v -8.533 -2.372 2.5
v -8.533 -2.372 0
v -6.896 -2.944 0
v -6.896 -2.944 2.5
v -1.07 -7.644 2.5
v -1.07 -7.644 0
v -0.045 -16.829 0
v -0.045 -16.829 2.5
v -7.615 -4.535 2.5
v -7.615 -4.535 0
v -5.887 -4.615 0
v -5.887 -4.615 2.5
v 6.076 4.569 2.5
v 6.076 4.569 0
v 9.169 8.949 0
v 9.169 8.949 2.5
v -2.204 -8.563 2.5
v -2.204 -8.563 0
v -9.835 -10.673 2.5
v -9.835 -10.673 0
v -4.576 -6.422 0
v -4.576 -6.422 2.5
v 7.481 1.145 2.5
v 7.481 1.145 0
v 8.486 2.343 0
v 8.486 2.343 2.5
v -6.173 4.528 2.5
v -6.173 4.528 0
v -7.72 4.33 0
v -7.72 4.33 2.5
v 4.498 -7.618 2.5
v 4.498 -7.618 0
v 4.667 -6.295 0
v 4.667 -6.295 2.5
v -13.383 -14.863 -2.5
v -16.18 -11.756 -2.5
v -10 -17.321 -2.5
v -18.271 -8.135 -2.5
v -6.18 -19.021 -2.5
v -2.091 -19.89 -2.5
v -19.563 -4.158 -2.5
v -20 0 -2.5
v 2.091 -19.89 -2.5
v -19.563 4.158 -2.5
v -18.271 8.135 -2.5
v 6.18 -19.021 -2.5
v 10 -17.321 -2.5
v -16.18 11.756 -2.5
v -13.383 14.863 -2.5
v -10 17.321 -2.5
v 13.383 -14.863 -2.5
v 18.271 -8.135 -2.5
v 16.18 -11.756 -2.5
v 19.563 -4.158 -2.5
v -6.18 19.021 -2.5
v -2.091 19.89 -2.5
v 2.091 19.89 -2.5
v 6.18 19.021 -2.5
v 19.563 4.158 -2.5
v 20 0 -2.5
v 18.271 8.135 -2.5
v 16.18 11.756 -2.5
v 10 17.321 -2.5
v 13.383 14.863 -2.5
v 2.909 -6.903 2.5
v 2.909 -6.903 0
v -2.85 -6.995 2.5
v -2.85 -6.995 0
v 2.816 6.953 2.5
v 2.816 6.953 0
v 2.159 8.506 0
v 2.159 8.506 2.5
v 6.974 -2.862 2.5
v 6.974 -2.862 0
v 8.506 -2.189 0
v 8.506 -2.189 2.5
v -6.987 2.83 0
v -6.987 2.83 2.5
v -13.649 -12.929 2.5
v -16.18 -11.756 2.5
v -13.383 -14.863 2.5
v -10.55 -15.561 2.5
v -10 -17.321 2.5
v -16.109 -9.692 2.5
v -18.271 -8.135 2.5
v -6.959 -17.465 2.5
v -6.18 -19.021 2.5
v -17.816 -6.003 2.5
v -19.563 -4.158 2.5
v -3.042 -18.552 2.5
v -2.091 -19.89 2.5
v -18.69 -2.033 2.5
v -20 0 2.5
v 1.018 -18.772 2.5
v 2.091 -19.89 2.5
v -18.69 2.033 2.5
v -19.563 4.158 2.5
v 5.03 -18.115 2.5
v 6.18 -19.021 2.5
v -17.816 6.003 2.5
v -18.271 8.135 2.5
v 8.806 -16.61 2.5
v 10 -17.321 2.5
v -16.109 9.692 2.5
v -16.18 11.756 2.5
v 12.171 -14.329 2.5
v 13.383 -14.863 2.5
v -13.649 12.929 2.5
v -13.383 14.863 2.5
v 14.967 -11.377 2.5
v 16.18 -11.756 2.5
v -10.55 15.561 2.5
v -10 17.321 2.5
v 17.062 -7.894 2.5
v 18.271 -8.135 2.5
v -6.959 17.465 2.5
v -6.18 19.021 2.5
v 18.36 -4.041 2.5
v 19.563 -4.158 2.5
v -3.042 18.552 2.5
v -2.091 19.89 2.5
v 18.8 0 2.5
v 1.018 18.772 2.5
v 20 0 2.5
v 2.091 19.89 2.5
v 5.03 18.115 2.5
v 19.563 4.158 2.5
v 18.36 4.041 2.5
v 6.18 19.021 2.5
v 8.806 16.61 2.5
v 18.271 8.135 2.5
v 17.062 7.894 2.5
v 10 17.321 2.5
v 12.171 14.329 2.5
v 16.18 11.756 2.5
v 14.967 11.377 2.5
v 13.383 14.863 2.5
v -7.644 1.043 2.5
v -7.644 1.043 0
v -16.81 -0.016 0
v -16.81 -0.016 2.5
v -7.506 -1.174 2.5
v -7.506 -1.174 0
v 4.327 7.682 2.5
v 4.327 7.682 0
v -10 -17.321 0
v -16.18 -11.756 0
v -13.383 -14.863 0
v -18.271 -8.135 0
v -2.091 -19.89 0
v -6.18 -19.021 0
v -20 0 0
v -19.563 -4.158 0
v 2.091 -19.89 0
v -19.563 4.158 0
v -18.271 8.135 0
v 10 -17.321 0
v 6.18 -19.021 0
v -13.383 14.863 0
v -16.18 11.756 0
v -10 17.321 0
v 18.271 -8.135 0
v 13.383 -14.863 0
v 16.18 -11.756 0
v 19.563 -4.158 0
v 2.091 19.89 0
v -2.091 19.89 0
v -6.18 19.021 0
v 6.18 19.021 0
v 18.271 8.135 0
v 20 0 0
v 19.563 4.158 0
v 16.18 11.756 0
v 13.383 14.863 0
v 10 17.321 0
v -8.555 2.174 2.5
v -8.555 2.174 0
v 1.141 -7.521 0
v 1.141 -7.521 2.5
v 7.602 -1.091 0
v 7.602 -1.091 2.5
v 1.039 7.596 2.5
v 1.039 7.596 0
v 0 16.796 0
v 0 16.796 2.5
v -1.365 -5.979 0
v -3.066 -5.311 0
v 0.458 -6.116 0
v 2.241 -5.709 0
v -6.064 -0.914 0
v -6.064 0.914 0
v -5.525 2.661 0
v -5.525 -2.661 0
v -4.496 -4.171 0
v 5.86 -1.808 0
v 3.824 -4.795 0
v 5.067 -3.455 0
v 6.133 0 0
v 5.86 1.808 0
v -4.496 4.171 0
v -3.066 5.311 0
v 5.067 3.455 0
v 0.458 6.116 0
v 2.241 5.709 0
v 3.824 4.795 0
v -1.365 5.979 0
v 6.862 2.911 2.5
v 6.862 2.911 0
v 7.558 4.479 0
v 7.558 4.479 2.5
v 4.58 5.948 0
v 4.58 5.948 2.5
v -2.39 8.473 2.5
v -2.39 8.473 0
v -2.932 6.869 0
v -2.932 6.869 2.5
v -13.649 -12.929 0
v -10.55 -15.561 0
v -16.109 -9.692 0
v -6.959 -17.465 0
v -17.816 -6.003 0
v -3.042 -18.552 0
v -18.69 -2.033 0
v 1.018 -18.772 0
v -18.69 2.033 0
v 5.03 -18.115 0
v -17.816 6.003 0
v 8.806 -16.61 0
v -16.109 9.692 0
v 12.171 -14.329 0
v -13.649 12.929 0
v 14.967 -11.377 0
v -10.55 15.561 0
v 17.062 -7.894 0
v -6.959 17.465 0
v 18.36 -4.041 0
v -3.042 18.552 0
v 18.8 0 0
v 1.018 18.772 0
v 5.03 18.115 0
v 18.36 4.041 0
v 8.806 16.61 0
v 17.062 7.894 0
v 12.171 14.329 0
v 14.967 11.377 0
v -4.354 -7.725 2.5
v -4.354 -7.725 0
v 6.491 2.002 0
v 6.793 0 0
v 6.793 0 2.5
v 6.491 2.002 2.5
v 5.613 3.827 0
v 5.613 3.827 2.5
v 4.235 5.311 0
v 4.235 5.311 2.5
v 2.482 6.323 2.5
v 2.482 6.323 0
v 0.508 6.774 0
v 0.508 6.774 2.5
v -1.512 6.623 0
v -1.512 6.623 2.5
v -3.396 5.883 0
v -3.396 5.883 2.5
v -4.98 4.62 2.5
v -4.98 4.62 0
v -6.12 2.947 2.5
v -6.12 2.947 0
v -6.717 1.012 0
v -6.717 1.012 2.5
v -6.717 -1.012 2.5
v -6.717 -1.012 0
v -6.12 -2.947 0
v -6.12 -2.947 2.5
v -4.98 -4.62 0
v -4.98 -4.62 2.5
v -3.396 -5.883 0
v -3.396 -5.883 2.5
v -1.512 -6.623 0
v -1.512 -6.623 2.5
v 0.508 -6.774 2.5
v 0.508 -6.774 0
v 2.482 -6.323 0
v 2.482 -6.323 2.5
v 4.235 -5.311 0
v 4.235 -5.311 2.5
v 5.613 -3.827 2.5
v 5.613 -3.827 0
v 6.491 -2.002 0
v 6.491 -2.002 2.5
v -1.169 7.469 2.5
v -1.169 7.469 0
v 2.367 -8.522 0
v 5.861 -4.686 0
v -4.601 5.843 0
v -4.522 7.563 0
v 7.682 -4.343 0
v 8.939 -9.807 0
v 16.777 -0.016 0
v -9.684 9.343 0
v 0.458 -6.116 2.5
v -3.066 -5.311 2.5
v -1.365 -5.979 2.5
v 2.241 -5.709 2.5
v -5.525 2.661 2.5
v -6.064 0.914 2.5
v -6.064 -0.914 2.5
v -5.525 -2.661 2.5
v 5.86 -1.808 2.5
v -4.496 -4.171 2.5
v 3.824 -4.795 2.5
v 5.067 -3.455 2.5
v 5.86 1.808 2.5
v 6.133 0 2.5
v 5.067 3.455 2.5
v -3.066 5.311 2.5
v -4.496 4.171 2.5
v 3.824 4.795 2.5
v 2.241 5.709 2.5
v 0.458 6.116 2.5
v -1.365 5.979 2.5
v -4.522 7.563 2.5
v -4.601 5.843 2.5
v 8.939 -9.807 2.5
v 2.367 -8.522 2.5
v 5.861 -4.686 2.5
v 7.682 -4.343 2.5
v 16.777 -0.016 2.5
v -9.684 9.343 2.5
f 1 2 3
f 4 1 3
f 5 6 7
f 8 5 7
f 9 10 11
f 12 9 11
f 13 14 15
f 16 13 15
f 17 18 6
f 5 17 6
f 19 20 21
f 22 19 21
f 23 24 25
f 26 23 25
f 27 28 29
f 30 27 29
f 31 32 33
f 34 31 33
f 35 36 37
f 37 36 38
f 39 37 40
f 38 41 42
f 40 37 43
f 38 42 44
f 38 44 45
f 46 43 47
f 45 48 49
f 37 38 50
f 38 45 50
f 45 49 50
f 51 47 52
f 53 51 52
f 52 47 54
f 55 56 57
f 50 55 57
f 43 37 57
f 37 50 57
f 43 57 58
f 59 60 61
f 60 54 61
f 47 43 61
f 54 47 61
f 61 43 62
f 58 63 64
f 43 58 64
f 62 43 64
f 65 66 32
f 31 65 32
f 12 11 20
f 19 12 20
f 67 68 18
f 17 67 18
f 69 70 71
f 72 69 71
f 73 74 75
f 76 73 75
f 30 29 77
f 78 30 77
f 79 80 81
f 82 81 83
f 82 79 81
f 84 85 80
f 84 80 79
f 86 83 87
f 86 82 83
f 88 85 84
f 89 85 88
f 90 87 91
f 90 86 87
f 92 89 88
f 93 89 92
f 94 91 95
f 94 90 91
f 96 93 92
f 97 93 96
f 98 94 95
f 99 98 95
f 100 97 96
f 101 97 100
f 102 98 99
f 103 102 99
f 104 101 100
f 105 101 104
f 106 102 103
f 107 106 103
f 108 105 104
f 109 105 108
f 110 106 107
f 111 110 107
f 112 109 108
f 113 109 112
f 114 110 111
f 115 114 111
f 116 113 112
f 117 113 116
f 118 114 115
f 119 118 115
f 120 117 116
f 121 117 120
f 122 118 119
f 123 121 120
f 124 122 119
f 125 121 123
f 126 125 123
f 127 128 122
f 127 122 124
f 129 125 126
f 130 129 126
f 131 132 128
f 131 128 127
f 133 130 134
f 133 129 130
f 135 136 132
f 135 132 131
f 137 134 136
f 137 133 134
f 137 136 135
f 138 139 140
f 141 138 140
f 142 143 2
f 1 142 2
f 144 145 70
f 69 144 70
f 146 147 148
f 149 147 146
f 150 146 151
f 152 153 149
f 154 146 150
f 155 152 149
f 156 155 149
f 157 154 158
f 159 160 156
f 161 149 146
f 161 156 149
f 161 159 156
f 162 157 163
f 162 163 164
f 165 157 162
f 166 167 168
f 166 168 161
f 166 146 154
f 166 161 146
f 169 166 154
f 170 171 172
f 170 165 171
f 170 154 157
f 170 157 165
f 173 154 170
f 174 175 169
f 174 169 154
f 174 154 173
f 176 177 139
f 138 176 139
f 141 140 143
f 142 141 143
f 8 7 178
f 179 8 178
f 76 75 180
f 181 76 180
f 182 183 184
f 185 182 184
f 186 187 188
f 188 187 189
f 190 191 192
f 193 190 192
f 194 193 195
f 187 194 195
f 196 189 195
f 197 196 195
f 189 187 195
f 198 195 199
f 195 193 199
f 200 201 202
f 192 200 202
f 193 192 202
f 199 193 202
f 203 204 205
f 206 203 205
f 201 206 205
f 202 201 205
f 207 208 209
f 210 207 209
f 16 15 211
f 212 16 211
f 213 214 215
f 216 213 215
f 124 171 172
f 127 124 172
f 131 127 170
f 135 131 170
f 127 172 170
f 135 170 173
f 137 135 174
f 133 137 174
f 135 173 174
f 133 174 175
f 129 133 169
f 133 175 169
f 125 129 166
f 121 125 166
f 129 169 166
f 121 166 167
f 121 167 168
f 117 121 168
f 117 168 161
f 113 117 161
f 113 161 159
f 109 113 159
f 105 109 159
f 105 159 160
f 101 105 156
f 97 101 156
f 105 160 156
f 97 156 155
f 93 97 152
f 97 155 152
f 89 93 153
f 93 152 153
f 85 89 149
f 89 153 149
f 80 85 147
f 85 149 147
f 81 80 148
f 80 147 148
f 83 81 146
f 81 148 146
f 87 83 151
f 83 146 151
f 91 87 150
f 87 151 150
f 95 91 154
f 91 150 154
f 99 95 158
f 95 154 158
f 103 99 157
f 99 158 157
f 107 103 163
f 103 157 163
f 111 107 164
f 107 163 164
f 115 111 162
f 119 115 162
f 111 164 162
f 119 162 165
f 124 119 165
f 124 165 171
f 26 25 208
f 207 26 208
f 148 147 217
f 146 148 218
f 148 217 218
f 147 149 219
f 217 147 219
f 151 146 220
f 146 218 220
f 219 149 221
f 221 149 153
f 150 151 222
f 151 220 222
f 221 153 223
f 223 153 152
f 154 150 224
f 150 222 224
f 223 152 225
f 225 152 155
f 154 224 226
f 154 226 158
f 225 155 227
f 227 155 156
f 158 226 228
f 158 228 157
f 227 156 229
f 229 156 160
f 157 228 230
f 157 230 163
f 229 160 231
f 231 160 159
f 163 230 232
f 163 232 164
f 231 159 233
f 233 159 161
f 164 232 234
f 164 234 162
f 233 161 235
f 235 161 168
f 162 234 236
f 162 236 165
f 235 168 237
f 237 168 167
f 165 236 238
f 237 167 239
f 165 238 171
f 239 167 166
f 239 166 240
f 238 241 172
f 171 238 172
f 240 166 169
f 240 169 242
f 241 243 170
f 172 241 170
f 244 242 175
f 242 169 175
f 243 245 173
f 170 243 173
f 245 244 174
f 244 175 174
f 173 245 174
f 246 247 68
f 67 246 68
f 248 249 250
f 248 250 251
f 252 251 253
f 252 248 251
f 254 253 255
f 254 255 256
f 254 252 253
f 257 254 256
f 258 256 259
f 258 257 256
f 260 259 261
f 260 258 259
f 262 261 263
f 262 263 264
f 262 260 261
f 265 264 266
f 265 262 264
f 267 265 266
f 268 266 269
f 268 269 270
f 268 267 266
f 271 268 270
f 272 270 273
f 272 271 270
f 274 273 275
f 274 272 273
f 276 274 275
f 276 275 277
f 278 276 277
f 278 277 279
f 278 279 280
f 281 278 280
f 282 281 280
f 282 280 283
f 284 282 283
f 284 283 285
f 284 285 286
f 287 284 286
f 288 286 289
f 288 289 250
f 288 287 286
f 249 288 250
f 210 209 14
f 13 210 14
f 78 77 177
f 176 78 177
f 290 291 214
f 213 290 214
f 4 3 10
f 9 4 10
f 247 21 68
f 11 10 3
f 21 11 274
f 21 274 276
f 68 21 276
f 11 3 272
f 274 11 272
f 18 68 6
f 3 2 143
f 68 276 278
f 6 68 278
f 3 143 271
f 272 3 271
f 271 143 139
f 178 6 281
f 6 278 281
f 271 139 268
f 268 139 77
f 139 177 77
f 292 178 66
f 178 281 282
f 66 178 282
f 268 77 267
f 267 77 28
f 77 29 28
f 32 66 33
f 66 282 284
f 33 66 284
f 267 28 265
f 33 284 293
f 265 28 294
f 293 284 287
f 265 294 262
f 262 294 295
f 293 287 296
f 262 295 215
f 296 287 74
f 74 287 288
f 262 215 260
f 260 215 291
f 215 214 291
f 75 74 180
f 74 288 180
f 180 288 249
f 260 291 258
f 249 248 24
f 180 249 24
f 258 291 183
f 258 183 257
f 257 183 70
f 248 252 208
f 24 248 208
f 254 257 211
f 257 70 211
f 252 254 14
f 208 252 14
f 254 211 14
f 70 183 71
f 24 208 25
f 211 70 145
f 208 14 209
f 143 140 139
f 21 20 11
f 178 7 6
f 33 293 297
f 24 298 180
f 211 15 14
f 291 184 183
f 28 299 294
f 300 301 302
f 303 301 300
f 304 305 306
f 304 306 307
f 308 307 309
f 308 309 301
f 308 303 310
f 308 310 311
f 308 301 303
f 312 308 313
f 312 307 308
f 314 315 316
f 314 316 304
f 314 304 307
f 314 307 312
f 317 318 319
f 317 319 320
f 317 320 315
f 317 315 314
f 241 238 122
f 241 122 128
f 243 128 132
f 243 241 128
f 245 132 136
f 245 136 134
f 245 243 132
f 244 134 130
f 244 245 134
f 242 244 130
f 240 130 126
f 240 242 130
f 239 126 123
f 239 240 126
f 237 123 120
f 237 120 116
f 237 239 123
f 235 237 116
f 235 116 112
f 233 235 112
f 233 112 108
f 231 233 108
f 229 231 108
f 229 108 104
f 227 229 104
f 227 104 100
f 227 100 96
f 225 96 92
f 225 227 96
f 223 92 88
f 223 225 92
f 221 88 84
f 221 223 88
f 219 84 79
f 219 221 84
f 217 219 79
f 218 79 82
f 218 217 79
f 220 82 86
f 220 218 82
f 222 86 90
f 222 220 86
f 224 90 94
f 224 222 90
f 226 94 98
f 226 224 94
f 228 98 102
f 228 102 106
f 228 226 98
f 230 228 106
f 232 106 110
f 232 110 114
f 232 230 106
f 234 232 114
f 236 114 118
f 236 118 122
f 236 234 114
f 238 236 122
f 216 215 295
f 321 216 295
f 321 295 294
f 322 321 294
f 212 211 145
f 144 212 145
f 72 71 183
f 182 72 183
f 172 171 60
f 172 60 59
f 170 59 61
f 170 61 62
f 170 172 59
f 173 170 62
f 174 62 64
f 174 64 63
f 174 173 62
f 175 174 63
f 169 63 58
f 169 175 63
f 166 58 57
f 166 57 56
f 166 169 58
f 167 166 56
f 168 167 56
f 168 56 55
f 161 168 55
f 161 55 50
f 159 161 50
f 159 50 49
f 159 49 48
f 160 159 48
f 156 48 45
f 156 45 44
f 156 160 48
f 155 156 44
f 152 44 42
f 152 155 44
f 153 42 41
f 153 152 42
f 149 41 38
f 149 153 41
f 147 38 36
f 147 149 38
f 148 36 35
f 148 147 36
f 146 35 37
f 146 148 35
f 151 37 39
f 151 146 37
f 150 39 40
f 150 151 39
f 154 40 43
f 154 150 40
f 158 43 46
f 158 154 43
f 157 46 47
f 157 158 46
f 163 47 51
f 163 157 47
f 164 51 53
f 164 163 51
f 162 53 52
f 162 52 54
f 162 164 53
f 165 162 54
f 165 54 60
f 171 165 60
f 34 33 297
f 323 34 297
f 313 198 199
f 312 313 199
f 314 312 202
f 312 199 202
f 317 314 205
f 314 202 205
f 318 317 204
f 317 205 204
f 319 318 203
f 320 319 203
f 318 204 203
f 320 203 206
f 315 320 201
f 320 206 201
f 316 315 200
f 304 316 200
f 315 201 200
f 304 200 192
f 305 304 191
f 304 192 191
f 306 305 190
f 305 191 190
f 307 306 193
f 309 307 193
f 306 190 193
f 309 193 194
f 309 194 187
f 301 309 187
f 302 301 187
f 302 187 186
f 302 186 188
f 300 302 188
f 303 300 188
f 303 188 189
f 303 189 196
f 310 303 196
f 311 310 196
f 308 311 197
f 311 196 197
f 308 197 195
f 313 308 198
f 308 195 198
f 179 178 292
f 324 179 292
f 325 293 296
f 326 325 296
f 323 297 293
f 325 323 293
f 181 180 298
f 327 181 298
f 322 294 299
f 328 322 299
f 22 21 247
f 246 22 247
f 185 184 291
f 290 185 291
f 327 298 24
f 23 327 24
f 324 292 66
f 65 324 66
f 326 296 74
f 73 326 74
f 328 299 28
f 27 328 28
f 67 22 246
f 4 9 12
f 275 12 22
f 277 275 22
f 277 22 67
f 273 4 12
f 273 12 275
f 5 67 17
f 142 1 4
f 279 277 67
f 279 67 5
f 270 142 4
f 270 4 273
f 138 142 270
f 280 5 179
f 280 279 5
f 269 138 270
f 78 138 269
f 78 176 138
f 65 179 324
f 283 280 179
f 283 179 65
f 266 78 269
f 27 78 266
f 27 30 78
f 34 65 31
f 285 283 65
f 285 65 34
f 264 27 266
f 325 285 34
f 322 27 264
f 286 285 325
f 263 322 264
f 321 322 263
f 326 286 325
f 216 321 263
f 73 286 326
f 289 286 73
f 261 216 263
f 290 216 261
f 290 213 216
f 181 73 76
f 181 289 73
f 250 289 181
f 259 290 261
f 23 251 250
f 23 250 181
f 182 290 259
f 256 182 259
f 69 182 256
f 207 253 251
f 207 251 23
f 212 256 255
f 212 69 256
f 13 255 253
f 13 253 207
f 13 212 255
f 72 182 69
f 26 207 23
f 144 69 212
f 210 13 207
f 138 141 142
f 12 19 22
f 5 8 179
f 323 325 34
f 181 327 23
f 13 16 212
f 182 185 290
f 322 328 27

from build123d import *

# Parameters (mm, degrees)
F0_R     = 6.1327488562
F1_DEPTH = 2.5
F0_R_2   = 6.7928380713
F0_R_3   = 20
F0_R_4   = 18.8
F2_DEPTH = 2.5


with BuildPart() as f1:
    # F0 (on Top) → F1 (new body)
    with BuildSketch(Plane.XY):
        Circle(F0_R)
    extrude(amount=F1_DEPTH)


with BuildPart() as f1b:
    # F0 (on Top) → F1, piece 2 (new body)
    with BuildSketch(Plane.XY):
        Polygon((-7.6435967349, 1.0434347205), (-16.8098479044, -0.0162622448), (-7.5063370168, -1.173548284), (-8.5332849994, -2.3723696359), (-6.8961842917, -2.9438508209), (-7.6145799831, -4.5352084562), (-5.8870068751, -4.615157377), (-9.8348688334, -10.6725841761), (-4.5757410116, -6.4222076908), (-4.3537789024, -7.7253044583), (-2.8498813044, -6.9948397577), (-2.2040717304, -8.5630370304), (-1.0699772974, -7.6435618103), (-0.0449164761, -16.8285462119), (1.1409935541, -7.5209443457), (2.3673565593, -8.522474207), (2.9090000317, -6.9026532583), (4.4981618412, -7.6180319302), (4.6667866409, -6.2945820391), (8.9388918132, -9.8065212369), (5.860612262, -4.685937427), (7.681875024, -4.3429308571), (6.973686628, -2.8615165502), (8.5056861863, -2.1894602105), (7.6023219153, -1.0914477753), (16.7771086562, -0.0162622448), (7.4810241349, 1.1445758864), (8.4864869714, 2.3433971219), (6.8622766994, 2.9105816502), (7.5583667494, 4.4789318927), (6.0759531334, 4.5691658743), (9.1685894877, 8.9486911893), (4.5796297491, 5.9480578639), (4.3267053552, 7.6823970303), (2.816384891, 6.9525293075), (2.1587812807, 8.5062077269), (1.0386873037, 7.5956801884), (0, 16.7960217223), (-1.1687686201, 7.4688196182), (-2.3900324013, 8.4732910618), (-2.9320132453, 6.8690273911), (-4.5218244195, 7.5627630576), (-4.6013146639, 5.8428766206), (-9.6843484789, 9.3433009461), (-6.1732097529, 4.5275227167), (-7.7200760134, 4.329867661), (-6.9873169996, 2.8299740516), (-8.5550965741, 2.1736943163), align=None)
        Circle(F0_R_2, mode=Mode.SUBTRACT)
    extrude(amount=F1_DEPTH)


with BuildPart() as f1c:
    # F0 (on Top) → F1, piece 3 (new body)
    with BuildSketch(Plane.XY):
        Circle(F0_R_3)
        Circle(F0_R_4, mode=Mode.SUBTRACT)
    extrude(amount=F1_DEPTH)


with BuildPart() as f2:
    # F0 (on Top) → F2 (new body)
    with BuildSketch(Plane.XY):
        Circle(F0_R_3)
        Circle(F0_R_4, mode=Mode.SUBTRACT)
        Circle(F0_R_4)
        Polygon((-7.5063370168, -1.173548284), (-16.8098479044, -0.0162622448), (-7.6435967349, 1.0434347205), (-8.5550965741, 2.1736943163), (-6.9873169996, 2.8299740516), (-7.7200760134, 4.329867661), (-6.1732097529, 4.5275227167), (-9.6843484789, 9.3433009461), (-4.6013146639, 5.8428766206), (-4.5218244195, 7.5627630576), (-2.9320132453, 6.8690273911), (-2.3900324013, 8.4732910618), (-1.1687686201, 7.4688196182), (0, 16.7960217223), (1.0386873037, 7.5956801884), (2.1587812807, 8.5062077269), (2.816384891, 6.9525293075), (4.3267053552, 7.6823970303), (4.5796297491, 5.9480578639), (9.1685894877, 8.9486911893), (6.0759531334, 4.5691658743), (7.5583667494, 4.4789318927), (6.8622766994, 2.9105816502), (8.4864869714, 2.3433971219), (7.4810241349, 1.1445758864), (16.7771086562, -0.0162622448), (7.6023219153, -1.0914477753), (8.5056861863, -2.1894602105), (6.973686628, -2.8615165502), (7.681875024, -4.3429308571), (5.860612262, -4.685937427), (8.9388918132, -9.8065212369), (4.6667866409, -6.2945820391), (4.4981618412, -7.6180319302), (2.9090000317, -6.9026532583), (2.3673565593, -8.522474207), (1.1409935541, -7.5209443457), (-0.0449164761, -16.8285462119), (-1.0699772974, -7.6435618103), (-2.2040717304, -8.5630370304), (-2.8498813044, -6.9948397577), (-4.3537789024, -7.7253044583), (-4.5757410116, -6.4222076908), (-9.8348688334, -10.6725841761), (-5.8870068751, -4.615157377), (-7.6145799831, -4.5352084562), (-6.8961842917, -2.9438508209), (-8.5332849994, -2.3723696359), align=None, mode=Mode.SUBTRACT)
        Polygon((-7.6435967349, 1.0434347205), (-16.8098479044, -0.0162622448), (-7.5063370168, -1.173548284), (-8.5332849994, -2.3723696359), (-6.8961842917, -2.9438508209), (-7.6145799831, -4.5352084562), (-5.8870068751, -4.615157377), (-9.8348688334, -10.6725841761), (-4.5757410116, -6.4222076908), (-4.3537789024, -7.7253044583), (-2.8498813044, -6.9948397577), (-2.2040717304, -8.5630370304), (-1.0699772974, -7.6435618103), (-0.0449164761, -16.8285462119), (1.1409935541, -7.5209443457), (2.3673565593, -8.522474207), (2.9090000317, -6.9026532583), (4.4981618412, -7.6180319302), (4.6667866409, -6.2945820391), (8.9388918132, -9.8065212369), (5.860612262, -4.685937427), (7.681875024, -4.3429308571), (6.973686628, -2.8615165502), (8.5056861863, -2.1894602105), (7.6023219153, -1.0914477753), (16.7771086562, -0.0162622448), (7.4810241349, 1.1445758864), (8.4864869714, 2.3433971219), (6.8622766994, 2.9105816502), (7.5583667494, 4.4789318927), (6.0759531334, 4.5691658743), (9.1685894877, 8.9486911893), (4.5796297491, 5.9480578639), (4.3267053552, 7.6823970303), (2.816384891, 6.9525293075), (2.1587812807, 8.5062077269), (1.0386873037, 7.5956801884), (0, 16.7960217223), (-1.1687686201, 7.4688196182), (-2.3900324013, 8.4732910618), (-2.9320132453, 6.8690273911), (-4.5218244195, 7.5627630576), (-4.6013146639, 5.8428766206), (-9.6843484789, 9.3433009461), (-6.1732097529, 4.5275227167), (-7.7200760134, 4.329867661), (-6.9873169996, 2.8299740516), (-8.5550965741, 2.1736943163), align=None)
        Circle(F0_R_2, mode=Mode.SUBTRACT)
        Circle(F0_R_2)
        Circle(F0_R, mode=Mode.SUBTRACT)
        Circle(F0_R)
    extrude(amount=-F2_DEPTH)


solid = Compound([f1.part, f1b.part, f1c.part, f2.part])
